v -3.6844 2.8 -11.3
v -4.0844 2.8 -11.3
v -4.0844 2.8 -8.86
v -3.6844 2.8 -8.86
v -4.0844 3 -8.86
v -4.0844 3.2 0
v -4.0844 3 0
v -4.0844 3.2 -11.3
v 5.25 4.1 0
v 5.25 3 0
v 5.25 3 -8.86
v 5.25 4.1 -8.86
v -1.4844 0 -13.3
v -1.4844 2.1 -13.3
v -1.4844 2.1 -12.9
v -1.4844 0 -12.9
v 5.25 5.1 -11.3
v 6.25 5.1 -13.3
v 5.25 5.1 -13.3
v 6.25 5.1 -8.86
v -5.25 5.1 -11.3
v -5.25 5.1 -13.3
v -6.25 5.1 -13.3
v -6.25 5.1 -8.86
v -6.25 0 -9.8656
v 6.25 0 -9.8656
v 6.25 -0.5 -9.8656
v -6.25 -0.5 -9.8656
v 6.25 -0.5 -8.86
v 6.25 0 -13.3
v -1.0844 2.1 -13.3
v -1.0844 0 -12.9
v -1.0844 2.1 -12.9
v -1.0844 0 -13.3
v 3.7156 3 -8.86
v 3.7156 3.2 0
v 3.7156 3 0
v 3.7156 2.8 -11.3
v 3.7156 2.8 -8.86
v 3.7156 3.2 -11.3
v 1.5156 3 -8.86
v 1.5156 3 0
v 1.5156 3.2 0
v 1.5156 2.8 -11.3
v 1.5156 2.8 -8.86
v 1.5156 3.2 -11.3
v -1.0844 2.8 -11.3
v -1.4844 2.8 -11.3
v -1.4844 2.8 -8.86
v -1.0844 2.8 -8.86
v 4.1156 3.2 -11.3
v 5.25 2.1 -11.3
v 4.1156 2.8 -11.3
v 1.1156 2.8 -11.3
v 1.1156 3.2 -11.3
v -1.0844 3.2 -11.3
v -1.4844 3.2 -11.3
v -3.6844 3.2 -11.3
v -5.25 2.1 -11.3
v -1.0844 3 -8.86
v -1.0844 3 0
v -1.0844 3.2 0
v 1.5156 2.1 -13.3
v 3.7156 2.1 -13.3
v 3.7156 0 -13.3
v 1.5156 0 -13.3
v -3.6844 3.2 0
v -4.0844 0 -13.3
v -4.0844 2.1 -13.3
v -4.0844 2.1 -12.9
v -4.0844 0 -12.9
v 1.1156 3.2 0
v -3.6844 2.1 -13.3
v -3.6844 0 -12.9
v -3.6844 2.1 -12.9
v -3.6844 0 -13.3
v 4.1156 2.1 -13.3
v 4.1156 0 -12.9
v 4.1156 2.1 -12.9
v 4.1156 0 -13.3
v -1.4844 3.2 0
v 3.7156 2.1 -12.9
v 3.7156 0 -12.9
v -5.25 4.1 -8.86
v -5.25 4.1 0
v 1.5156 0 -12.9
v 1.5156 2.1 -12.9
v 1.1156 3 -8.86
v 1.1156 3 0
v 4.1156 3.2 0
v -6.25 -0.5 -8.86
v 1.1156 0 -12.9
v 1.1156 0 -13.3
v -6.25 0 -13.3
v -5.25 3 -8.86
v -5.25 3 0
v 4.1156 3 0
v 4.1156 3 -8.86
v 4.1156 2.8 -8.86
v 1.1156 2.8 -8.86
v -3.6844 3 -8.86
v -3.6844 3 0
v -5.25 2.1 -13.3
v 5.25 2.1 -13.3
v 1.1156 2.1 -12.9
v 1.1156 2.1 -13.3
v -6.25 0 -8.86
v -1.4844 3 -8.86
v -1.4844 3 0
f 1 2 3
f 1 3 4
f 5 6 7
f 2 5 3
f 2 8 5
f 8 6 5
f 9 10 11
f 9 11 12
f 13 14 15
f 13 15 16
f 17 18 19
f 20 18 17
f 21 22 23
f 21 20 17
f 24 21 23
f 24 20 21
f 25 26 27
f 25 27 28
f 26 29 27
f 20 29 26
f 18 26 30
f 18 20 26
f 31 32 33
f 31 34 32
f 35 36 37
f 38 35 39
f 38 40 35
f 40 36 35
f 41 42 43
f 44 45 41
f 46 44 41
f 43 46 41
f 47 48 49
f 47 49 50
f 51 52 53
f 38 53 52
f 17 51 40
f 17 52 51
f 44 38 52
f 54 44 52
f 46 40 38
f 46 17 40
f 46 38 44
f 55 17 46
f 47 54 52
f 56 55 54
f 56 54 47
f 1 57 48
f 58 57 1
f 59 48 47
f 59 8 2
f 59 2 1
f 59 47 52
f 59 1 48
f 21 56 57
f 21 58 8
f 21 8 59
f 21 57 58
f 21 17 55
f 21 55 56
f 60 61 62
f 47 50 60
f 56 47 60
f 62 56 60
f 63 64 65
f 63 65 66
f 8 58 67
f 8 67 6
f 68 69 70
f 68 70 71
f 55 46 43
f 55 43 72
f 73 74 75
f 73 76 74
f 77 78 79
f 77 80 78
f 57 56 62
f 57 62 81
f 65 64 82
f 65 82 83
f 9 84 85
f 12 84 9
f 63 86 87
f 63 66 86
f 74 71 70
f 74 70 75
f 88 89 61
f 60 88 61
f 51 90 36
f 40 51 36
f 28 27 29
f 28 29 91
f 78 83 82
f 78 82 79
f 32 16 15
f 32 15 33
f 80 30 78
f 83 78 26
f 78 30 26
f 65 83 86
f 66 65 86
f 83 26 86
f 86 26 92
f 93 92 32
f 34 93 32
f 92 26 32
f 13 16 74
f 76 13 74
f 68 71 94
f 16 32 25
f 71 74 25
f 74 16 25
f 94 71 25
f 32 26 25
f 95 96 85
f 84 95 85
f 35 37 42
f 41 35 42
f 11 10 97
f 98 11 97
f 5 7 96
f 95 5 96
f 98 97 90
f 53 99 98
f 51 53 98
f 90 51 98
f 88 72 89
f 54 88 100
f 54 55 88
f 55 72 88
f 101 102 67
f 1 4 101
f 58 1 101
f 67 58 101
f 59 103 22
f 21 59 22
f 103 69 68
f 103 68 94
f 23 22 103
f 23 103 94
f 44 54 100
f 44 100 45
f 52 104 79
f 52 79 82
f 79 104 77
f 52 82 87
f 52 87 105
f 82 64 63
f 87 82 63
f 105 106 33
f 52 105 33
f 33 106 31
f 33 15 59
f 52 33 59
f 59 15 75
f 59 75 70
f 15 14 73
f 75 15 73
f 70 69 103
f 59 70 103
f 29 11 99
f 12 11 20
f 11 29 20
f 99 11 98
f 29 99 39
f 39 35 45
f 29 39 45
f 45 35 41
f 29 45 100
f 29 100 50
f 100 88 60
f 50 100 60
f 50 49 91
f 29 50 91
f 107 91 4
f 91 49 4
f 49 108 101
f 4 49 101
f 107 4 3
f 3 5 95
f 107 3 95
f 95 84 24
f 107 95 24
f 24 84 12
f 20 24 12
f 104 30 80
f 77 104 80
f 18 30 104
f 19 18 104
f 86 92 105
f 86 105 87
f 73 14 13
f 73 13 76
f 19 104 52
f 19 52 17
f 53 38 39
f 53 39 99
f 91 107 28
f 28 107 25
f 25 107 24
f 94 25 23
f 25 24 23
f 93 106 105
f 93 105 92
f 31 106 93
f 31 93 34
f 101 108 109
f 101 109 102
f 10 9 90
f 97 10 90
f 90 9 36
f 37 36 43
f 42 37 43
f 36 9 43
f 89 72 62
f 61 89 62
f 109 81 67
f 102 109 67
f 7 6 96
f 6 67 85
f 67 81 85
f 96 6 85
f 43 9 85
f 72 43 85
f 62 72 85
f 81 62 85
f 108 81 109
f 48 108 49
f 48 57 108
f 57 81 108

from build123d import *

# Parameters (mm, degrees)
SKETCH_1_W             = 6.25
SKETCH_1_H             = 5.1
EXTRUDE_1_DEPTH        = 13.3
SKETCH_2_W             = 6.25
SKETCH_2_H             = 8.86
CUT_EXTRUDE_1_DEPTH    = 3
SKETCH_7_W             = 12.5
SKETCH_7_H             = 8.86
CUT_EXTRUDE_2_DEPTH    = 1
SKETCH_8_W             = 12.5
SKETCH_8_H             = 1.005646511
EXTRUDE_2_DEPTH        = 0.5
SKETCH_9_W             = 1
SKETCH_9_H             = 1.1
CUT_EXTRUDE_3_DEPTH    = 8.86
SKETCH_6_W             = 0.4
SKETCH_6_H             = 0.4
PATTERN_LINEAR_1_COUNT = 4
PATTERN_LINEAR_1_PITCH = 2.6
SKETCH_10_W            = 10.5
SKETCH_10_H            = 3
CUT_EXTRUDE_4_DEPTH    = 2


with BuildPart() as part:
    # Эскиз1 → Бобышка-Вытянуть1 (new body)
    with BuildSketch(Plane.XY):
        with Locations((-3.125, 2.55)):
            Rectangle(SKETCH_1_W, SKETCH_1_H)
    extrude(amount=-EXTRUDE_1_DEPTH)

    # Эскиз2 → Вырез-Вытянуть1 (cut)
    with BuildSketch(Plane.XZ):
        with Locations((-3.125, -4.43)):
            Rectangle(SKETCH_2_W, SKETCH_2_H)
    extrude(amount=-CUT_EXTRUDE_1_DEPTH, mode=Mode.SUBTRACT)

    # Зеркальное отражение1: part across plane


with BuildPart() as part_1:
    add(part.part)
    add(part.part.mirror(Plane(origin=(0, 5.1, -13.3), x_dir=(0, 0, 1), z_dir=(1, 0, 0))))

    # Эскиз7 → Вырез-Вытянуть2 (cut)
    with BuildSketch(Plane(origin=(0, 5.1, 0), x_dir=(1, 0, 0), z_dir=(0, 1, 0))):
        with Locations((0, 4.43)):
            Rectangle(SKETCH_7_W, SKETCH_7_H)
    extrude(amount=-CUT_EXTRUDE_2_DEPTH, mode=Mode.SUBTRACT)

    # Эскиз8 → Бобышка-Вытянуть2 (add)
    with BuildSketch(Plane(origin=(0, 0, 0), x_dir=(-1, 0, 0), z_dir=(0, -1, 0))):
        with Locations((0, 9.362823256)):
            Rectangle(SKETCH_8_W, SKETCH_8_H)
    extrude(amount=EXTRUDE_2_DEPTH)

    # Эскиз9 → Вырез-Вытянуть3 (cut)
    with BuildSketch(Plane.XY):
        with Locations((5.75, 3.55)):
            Rectangle(SKETCH_9_W, SKETCH_9_H)
        with Locations((-5.75, 3.55)):
            Rectangle(SKETCH_9_W, SKETCH_9_H)
    extrude(amount=-CUT_EXTRUDE_3_DEPTH, mode=Mode.SUBTRACT)

    # Вырез-По траектории1: sweep along a curve in space
    with BuildLine() as sweep_1_path:
        Line((-3.88435792, 3, 0), (-3.88435792, 3, -13.1))
        Line((-3.88435792, 3, -13.1), (-3.88435792, -0.439783166, -13.1))
    # Эскиз6 → Вырез-По траектории1 (sweep, cut)
    with BuildSketch(Plane.XY):
        with Locations((-3.88435792, 3)):
            Rectangle(SKETCH_6_W, SKETCH_6_H)
    sweep_1 = sweep(path=sweep_1_path.line, transition=Transition.RIGHT, mode=Mode.SUBTRACT)

    # Линейный массив1: Вырез-По траектории1 ×4
    with Locations(*[(i * PATTERN_LINEAR_1_PITCH, 0, 0) for i in range(1, PATTERN_LINEAR_1_COUNT)]):
        add(sweep_1, mode=Mode.SUBTRACT)

    # Эскиз10 → Вырез-Вытянуть4 (cut)
    with BuildSketch(Plane(origin=(0, 0, -13.3), x_dir=(-1, 0, 0), z_dir=(0, 0, -1))):
        with Locations((0, 3.6)):
            Rectangle(SKETCH_10_W, SKETCH_10_H)
    extrude(amount=-CUT_EXTRUDE_4_DEPTH, mode=Mode.SUBTRACT)


solid = part_1.part
